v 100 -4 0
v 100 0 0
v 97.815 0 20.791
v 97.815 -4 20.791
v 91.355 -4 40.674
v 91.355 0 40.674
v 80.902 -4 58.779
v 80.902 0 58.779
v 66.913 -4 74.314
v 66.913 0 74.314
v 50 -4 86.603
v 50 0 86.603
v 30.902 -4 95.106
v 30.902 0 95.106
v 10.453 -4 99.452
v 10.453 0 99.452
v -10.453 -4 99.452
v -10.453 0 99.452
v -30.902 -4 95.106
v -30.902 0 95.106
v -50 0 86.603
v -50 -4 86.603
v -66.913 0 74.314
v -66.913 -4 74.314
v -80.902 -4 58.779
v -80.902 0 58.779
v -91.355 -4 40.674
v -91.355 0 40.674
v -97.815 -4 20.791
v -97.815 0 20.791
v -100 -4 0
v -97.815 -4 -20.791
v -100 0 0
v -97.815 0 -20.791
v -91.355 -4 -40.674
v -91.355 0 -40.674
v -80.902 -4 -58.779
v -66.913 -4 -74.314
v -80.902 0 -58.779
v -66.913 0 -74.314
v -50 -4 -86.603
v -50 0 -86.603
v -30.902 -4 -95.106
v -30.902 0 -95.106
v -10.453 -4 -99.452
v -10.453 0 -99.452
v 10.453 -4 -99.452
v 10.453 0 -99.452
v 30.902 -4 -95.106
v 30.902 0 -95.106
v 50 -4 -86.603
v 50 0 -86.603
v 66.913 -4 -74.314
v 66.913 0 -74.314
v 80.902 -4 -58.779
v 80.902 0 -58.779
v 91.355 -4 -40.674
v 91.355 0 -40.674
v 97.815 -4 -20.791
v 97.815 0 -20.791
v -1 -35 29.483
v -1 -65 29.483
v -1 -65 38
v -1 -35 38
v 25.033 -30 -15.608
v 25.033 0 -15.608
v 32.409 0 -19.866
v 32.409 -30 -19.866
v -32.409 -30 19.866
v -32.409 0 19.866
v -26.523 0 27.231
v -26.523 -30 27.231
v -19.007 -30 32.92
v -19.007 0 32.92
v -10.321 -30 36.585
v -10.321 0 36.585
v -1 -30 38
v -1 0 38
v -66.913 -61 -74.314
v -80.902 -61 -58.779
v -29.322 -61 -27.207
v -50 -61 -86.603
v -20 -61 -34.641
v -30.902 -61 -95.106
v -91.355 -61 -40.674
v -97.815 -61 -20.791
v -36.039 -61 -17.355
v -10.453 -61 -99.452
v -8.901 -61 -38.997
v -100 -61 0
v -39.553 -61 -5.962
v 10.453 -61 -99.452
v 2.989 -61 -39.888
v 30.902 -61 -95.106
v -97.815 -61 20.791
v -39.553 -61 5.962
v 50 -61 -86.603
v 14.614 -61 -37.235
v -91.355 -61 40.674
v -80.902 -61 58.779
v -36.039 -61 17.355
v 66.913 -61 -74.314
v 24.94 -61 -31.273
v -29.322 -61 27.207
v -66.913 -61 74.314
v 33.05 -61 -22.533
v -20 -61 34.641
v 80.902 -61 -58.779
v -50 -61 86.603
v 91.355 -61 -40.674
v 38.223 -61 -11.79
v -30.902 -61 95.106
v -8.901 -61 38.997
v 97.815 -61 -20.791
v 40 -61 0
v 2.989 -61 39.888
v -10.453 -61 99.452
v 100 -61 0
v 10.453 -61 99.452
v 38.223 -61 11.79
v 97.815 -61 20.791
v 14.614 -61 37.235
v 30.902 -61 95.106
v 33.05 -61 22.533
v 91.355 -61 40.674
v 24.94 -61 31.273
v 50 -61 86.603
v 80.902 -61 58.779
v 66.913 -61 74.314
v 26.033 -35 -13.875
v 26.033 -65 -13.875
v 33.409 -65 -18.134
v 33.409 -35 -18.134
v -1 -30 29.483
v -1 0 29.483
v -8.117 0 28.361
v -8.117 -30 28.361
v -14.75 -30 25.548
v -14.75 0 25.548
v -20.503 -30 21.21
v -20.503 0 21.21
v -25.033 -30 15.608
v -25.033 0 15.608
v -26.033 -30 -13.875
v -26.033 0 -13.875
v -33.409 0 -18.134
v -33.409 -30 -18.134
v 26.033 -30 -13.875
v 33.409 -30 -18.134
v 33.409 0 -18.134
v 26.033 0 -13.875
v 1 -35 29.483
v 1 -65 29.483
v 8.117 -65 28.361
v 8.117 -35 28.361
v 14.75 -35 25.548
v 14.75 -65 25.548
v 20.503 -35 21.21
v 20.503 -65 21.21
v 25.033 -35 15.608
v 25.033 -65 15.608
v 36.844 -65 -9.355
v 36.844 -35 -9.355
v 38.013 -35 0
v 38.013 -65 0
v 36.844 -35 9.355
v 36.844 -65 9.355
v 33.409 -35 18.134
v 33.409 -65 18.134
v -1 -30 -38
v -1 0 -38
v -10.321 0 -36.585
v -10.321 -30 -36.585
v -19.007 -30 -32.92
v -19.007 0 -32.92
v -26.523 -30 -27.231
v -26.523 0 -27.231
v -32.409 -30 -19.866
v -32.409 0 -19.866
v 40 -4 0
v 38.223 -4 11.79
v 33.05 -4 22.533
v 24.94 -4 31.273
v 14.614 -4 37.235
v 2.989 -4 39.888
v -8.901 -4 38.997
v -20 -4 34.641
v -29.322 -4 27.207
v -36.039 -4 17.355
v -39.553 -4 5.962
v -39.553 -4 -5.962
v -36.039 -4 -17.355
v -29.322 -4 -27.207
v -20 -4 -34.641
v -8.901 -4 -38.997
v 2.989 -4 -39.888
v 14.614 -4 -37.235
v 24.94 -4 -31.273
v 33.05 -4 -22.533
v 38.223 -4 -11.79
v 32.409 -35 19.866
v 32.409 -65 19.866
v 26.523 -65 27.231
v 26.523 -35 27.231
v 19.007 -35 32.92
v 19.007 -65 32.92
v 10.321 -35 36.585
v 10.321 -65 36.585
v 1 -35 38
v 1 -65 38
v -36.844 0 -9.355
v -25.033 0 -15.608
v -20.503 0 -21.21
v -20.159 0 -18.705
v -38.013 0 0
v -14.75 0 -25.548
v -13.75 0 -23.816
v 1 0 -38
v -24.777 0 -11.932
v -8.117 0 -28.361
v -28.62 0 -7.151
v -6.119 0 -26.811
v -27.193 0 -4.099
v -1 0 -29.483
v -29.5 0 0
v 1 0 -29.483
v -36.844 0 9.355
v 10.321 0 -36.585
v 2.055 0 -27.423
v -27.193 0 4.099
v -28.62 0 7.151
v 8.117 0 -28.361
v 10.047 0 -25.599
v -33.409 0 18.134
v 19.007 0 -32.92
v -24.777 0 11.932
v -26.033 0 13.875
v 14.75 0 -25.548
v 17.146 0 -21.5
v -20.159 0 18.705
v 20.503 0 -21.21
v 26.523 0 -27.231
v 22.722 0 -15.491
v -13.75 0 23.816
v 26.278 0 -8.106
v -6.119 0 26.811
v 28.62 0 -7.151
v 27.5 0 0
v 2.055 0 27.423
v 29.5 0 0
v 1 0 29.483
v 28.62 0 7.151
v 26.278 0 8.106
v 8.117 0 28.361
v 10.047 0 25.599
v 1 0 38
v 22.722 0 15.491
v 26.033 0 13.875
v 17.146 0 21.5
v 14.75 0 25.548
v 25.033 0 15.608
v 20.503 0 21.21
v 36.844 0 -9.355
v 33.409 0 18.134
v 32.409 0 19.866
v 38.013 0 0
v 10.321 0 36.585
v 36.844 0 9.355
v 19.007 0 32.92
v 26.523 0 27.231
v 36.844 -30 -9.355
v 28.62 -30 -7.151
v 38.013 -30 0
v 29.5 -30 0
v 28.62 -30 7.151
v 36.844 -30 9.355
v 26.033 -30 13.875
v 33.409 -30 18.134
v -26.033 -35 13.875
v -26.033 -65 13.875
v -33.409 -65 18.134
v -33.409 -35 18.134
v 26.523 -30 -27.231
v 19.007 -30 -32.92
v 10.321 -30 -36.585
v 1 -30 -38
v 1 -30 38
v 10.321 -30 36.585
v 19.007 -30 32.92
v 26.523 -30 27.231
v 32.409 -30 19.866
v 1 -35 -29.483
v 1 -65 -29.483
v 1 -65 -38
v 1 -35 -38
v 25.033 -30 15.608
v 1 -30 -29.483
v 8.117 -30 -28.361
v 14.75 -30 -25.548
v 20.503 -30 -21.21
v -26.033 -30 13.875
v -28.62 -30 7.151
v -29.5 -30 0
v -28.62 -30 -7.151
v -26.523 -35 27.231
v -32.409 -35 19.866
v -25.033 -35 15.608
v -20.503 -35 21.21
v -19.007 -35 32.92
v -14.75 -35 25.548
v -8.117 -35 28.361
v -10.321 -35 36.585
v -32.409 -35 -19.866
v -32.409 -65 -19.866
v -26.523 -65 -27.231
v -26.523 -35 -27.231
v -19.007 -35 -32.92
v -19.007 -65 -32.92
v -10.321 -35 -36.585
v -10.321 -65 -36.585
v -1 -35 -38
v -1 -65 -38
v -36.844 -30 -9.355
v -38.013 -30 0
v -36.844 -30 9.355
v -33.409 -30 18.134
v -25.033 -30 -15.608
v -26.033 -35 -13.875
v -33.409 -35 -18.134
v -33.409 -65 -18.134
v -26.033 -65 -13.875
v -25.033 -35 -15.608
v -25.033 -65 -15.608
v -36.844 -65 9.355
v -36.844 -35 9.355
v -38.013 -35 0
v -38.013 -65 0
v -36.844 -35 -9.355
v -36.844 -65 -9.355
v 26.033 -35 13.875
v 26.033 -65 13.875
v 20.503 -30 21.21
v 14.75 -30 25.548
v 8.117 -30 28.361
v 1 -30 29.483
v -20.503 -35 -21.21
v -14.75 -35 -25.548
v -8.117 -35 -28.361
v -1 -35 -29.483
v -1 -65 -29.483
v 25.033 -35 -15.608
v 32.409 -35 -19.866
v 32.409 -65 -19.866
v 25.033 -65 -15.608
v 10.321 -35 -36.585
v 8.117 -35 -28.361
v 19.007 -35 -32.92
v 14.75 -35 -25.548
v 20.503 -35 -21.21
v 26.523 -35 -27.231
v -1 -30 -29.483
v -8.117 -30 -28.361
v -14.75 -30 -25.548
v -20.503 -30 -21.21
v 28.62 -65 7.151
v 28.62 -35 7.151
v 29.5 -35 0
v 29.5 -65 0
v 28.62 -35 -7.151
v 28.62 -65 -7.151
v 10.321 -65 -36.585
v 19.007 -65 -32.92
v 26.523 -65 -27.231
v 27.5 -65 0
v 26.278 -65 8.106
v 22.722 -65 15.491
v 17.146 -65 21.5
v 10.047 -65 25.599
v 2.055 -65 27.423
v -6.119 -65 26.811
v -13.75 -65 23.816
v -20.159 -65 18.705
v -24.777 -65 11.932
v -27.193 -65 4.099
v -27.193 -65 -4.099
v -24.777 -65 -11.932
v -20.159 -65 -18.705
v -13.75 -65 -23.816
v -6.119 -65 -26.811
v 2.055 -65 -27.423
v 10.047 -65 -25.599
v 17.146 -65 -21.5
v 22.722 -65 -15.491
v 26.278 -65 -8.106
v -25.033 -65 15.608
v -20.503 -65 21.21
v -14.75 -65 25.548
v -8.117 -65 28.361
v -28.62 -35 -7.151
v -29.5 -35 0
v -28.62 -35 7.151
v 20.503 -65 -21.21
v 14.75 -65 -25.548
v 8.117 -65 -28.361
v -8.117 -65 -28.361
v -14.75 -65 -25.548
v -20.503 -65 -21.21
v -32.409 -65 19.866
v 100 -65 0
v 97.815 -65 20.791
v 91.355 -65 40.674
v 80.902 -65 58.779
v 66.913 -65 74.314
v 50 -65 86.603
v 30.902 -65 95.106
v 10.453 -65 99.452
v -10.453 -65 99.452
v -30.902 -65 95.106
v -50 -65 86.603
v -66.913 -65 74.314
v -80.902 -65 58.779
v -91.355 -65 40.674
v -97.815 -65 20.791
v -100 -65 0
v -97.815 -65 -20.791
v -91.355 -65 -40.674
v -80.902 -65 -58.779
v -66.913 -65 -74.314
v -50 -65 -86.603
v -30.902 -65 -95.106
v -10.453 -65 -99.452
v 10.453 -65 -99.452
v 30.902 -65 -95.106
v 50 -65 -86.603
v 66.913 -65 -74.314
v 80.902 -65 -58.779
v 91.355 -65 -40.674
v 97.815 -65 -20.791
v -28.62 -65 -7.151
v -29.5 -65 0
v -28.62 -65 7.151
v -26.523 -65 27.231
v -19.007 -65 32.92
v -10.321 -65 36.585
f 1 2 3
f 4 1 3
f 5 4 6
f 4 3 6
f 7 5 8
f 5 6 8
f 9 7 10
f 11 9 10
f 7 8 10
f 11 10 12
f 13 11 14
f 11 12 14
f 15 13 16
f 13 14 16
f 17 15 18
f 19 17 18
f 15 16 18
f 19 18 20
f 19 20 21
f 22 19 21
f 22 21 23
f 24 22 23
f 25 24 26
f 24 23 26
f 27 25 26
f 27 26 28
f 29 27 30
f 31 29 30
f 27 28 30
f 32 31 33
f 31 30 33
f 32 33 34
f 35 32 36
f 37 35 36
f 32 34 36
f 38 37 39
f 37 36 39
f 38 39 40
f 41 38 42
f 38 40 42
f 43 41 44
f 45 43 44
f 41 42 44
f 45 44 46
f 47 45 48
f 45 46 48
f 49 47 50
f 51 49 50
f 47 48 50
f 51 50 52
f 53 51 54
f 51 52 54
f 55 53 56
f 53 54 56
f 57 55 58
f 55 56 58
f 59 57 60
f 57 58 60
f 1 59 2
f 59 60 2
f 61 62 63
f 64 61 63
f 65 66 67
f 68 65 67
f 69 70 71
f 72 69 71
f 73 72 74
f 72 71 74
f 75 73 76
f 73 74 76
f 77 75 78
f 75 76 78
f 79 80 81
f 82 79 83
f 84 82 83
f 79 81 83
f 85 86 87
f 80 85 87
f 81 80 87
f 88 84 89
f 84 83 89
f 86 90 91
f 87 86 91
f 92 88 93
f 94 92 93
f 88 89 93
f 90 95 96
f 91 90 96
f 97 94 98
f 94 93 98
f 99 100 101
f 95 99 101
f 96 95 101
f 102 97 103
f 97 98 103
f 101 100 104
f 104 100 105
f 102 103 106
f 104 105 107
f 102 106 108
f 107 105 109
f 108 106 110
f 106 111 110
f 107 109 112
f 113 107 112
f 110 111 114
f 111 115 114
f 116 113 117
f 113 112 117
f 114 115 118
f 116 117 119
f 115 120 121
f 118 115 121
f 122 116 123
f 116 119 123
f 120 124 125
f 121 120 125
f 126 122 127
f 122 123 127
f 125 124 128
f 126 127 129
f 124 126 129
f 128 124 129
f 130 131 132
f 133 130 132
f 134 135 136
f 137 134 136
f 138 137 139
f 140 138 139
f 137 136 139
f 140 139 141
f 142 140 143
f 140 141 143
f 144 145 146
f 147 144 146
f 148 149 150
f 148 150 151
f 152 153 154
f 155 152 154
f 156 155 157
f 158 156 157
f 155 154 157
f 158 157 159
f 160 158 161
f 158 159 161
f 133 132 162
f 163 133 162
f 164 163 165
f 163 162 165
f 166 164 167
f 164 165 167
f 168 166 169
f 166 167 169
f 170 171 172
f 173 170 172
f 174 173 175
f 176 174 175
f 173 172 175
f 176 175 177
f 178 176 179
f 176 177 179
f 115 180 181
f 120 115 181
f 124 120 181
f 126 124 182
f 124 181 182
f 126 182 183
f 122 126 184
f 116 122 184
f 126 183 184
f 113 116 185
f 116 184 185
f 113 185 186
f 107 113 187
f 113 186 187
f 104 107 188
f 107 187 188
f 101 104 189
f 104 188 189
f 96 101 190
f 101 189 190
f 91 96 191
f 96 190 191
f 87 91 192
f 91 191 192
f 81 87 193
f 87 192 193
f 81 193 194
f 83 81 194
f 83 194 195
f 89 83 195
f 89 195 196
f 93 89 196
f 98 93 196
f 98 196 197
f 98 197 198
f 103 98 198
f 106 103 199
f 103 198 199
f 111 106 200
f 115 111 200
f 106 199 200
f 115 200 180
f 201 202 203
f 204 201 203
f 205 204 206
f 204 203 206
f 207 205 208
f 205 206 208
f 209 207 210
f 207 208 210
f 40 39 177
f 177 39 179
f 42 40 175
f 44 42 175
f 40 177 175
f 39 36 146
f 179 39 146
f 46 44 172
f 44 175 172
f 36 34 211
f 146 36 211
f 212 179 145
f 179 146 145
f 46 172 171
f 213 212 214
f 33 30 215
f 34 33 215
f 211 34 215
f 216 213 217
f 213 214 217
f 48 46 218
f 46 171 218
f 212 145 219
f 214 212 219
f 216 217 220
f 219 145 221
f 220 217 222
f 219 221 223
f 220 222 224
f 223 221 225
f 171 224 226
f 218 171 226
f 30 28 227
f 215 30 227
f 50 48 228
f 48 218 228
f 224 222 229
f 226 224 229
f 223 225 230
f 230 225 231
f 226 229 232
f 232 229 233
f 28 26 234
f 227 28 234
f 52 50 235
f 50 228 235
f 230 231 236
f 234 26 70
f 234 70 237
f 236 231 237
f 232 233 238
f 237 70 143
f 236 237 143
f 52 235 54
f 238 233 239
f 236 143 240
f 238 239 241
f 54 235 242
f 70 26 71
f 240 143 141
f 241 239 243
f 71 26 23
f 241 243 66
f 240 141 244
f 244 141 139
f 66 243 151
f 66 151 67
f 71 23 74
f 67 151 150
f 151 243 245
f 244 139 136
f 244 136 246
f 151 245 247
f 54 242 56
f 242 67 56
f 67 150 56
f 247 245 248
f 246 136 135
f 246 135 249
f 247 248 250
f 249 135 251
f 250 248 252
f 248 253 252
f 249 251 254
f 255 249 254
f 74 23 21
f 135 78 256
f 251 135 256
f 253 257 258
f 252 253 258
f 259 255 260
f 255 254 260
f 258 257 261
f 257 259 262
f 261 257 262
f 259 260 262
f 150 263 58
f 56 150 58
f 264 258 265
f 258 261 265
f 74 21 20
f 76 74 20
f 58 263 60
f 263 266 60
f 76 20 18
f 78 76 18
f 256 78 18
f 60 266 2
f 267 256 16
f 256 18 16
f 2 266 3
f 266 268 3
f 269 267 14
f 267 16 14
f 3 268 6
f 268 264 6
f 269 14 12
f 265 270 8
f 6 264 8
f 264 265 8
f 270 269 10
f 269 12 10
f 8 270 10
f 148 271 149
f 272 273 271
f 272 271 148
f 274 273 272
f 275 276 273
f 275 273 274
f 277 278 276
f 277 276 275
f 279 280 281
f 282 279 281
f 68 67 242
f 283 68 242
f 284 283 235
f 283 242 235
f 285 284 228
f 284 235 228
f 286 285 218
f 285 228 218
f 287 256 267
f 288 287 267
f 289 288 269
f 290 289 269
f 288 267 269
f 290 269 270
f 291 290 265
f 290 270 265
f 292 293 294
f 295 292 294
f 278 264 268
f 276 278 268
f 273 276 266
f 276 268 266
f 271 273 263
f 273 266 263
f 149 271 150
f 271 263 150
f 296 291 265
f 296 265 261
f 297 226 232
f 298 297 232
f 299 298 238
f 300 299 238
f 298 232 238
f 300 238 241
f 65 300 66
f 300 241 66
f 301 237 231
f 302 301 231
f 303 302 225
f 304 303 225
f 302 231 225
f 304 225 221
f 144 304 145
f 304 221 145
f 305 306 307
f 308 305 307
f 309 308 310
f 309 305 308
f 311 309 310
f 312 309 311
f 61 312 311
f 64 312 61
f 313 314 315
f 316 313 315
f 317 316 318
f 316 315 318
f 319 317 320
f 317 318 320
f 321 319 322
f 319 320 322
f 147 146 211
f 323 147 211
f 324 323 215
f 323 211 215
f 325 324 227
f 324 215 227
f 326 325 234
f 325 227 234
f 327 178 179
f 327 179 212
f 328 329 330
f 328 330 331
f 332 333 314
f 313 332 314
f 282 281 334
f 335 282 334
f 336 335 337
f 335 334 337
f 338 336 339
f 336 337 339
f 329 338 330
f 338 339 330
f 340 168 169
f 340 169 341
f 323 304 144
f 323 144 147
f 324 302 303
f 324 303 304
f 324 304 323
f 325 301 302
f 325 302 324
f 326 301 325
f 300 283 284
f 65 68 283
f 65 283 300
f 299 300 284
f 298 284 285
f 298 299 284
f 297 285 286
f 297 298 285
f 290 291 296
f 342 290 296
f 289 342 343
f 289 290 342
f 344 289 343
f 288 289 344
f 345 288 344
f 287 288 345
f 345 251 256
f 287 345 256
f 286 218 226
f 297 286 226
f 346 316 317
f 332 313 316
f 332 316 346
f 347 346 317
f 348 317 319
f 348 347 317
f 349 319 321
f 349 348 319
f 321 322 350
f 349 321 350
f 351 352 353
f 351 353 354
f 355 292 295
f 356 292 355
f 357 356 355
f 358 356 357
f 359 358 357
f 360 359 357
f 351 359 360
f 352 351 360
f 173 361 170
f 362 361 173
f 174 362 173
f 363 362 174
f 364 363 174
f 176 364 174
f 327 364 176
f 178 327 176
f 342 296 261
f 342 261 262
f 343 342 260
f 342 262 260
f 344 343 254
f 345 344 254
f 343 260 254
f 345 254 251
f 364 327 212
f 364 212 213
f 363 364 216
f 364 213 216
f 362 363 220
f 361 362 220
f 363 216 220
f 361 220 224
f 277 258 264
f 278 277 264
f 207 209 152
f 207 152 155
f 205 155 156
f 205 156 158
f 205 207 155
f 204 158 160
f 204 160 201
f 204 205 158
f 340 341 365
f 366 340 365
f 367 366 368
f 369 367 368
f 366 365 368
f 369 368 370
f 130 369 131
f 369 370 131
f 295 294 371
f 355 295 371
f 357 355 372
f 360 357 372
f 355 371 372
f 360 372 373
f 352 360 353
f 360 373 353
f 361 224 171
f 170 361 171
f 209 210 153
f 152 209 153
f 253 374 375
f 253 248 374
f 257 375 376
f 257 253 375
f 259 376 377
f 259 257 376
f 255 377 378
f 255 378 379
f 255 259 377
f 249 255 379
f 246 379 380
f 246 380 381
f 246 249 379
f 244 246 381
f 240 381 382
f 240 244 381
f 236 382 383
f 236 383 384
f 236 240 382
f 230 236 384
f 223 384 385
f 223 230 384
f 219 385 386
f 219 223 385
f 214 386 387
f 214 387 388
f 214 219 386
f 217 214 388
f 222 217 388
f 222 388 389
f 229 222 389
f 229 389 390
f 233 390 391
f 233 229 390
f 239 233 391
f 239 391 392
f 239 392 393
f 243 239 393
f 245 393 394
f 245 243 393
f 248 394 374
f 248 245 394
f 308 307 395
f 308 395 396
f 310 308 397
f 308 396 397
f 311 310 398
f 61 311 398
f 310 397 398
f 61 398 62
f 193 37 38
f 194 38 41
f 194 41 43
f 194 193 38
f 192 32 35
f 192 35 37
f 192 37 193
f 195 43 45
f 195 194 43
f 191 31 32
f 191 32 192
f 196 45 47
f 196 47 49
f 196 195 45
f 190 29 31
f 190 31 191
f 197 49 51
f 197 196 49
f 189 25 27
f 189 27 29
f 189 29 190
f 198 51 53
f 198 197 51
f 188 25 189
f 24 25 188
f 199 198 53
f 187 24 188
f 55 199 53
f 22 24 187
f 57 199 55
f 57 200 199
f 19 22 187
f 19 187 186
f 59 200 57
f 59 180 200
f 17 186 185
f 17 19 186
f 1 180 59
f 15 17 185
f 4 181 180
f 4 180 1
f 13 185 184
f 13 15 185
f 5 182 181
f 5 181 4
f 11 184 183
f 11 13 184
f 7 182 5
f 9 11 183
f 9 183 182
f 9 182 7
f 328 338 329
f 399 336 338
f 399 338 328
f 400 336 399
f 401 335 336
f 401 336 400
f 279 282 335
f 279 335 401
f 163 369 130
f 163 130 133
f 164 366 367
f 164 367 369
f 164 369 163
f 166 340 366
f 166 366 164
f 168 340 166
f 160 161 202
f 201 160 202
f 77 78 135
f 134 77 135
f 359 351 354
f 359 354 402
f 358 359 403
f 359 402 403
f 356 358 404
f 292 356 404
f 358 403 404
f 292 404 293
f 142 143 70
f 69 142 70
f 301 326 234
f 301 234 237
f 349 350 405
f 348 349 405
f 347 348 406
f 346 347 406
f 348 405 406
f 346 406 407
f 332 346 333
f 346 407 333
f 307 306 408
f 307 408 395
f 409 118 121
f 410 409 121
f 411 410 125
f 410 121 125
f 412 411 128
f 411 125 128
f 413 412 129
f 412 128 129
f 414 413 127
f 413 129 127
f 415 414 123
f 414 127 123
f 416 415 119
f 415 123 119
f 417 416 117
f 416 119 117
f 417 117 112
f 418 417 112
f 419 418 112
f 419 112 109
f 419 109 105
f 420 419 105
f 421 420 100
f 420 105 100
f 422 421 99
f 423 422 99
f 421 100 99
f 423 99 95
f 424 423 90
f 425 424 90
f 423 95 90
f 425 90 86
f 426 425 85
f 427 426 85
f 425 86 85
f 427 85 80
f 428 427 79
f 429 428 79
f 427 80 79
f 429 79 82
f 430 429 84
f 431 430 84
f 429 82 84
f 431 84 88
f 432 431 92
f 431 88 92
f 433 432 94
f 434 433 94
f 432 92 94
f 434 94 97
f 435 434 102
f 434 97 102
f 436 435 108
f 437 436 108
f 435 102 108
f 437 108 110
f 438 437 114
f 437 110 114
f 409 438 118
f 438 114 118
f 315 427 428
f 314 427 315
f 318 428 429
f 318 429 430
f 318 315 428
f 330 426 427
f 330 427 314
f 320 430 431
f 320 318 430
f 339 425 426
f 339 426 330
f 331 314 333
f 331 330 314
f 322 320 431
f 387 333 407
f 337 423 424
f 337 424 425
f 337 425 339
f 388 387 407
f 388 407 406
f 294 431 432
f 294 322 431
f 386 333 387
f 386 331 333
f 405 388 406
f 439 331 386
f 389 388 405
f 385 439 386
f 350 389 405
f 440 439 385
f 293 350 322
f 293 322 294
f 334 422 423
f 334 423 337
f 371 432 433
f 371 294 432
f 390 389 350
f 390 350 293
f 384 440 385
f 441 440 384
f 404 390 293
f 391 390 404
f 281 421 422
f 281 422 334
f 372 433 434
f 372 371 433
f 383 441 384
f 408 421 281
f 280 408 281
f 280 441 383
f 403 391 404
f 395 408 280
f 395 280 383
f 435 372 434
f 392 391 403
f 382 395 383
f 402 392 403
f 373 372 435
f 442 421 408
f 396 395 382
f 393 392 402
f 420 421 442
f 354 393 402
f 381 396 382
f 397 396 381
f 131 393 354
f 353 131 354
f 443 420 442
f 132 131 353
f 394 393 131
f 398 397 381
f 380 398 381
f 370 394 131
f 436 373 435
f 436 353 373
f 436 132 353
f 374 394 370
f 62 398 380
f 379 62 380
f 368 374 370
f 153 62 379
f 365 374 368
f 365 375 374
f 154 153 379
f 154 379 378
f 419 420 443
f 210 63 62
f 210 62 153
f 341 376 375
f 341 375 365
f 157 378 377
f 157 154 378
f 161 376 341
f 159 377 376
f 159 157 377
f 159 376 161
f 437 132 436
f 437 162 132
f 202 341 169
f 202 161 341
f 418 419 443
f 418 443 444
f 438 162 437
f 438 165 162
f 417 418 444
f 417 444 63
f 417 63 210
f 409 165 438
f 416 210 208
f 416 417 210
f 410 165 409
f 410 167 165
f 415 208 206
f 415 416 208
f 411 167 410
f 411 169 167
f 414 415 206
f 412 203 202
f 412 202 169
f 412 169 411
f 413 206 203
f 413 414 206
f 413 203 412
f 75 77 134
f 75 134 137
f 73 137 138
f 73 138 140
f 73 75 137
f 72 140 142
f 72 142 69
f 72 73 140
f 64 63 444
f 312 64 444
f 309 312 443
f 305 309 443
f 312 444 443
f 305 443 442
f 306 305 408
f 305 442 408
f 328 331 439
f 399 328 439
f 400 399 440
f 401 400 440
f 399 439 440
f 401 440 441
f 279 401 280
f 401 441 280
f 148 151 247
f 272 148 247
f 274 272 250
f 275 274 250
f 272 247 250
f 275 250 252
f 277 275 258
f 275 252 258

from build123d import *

# Parameters (mm, degrees)
F0_R     = 100
F0_R_2   = 27.5
F1_DEPTH = 4
F2_R     = 40
F2_R_2   = 27.5
F3_DEPTH = 57
F4_R     = 100
F4_R_2   = 27.5
F5_DEPTH = 4
F7_DEPTH = 30
F9_DEPTH = 30


with BuildPart() as f1:
    # F0 (on Front) → F1 (new body)
    with BuildSketch(Plane.XZ):
        Circle(F0_R)
        Circle(F0_R_2, mode=Mode.SUBTRACT)
    extrude(amount=F1_DEPTH)

    # F2 (on face) → F3 (join)
    with BuildSketch(Plane.XZ.offset(4)):
        Circle(F2_R)
        Circle(F2_R_2, mode=Mode.SUBTRACT)
    extrude(amount=F3_DEPTH)

    # F4 (on face) → F5 (join)
    with BuildSketch(Plane.XZ.offset(61)):
        Circle(F4_R)
        Circle(F4_R_2, mode=Mode.SUBTRACT)
    extrude(amount=F5_DEPTH)

    # F6 (on face) → F7 (cut)
    with BuildSketch(Plane(origin=(0, 0, 0), x_dir=(-1, 0, 0), z_dir=(0, 1, 0))):
        with BuildLine():
            ThreePointArc((32.408965, 19.866025), (19.006578, 32.920358), (1, 38))
            Line((1, 38), (1, 29.483046))
            ThreePointArc((1, 29.483046), (14.75, 25.547749), (25.033067, 15.607548))
            Line((25.033067, 15.607548), (32.408965, 19.866025))
        make_face()
        with BuildLine():
            ThreePointArc((-25.033067, 15.607548), (-14.75, 25.547749), (-1, 29.483046))
            Line((-1, 29.483046), (-1, 38))
            ThreePointArc((-1, 38), (-19.006578, 32.920358), (-32.408965, 19.866025))
            Line((-32.408965, 19.866025), (-25.033067, 15.607548))
        make_face()
        with BuildLine():
            ThreePointArc((-26.033067, -13.875498), (-29.5, 0), (-26.033067, 13.875498))
            Line((-26.033067, 13.875498), (-33.408965, 18.133975))
            ThreePointArc((-33.408965, 18.133975), (-38.013156, 0), (-33.408965, -18.133975))
            Line((-33.408965, -18.133975), (-26.033067, -13.875498))
        make_face()
        with BuildLine():
            ThreePointArc((-1, -29.483046), (-14.75, -25.547749), (-25.033067, -15.607548))
            Line((-25.033067, -15.607548), (-32.408965, -19.866025))
            ThreePointArc((-32.408965, -19.866025), (-19.006578, -32.920358), (-1, -38))
            Line((-1, -38), (-1, -29.483046))
        make_face()
        with BuildLine():
            ThreePointArc((25.033067, -15.607548), (14.75, -25.547749), (1, -29.483046))
            Line((1, -29.483046), (1, -38))
            ThreePointArc((1, -38), (19.006578, -32.920358), (32.408965, -19.866025))
            Line((32.408965, -19.866025), (25.033067, -15.607548))
        make_face()
        with BuildLine():
            ThreePointArc((26.033067, 13.875498), (29.5, 0), (26.033067, -13.875498))
            Line((26.033067, -13.875498), (33.408965, -18.133975))
            ThreePointArc((33.408965, -18.133975), (38.013156, 0), (33.408965, 18.133975))
            Line((33.408965, 18.133975), (26.033067, 13.875498))
        make_face()
    extrude(amount=-F7_DEPTH, mode=Mode.SUBTRACT)

    # F8 (on face) → F9 (cut)
    with BuildSketch(Plane.XZ.offset(65)):
        with BuildLine():
            ThreePointArc((32.408965, 19.866025), (19.006578, 32.920358), (1, 38))
            Line((1, 38), (1, 29.483046))
            ThreePointArc((1, 29.483046), (14.75, 25.547749), (25.033067, 15.607548))
            Line((25.033067, 15.607548), (32.408965, 19.866025))
        make_face()
        with BuildLine():
            Line((-32.408965, 19.866025), (-25.033067, 15.607548))
            ThreePointArc((-25.033067, 15.607548), (-14.75, 25.547749), (-1, 29.483046))
            Line((-1, 29.483046), (-1, 38))
            ThreePointArc((-1, 38), (-19.006578, 32.920358), (-32.408965, 19.866025))
        make_face()
        with BuildLine():
            Line((-33.408965, -18.133975), (-26.033067, -13.875498))
            ThreePointArc((-26.033067, -13.875498), (-29.5, 0), (-26.033067, 13.875498))
            Line((-26.033067, 13.875498), (-33.408965, 18.133975))
            ThreePointArc((-33.408965, 18.133975), (-38.013156, 0), (-33.408965, -18.133975))
        make_face()
        with BuildLine():
            Line((-1, -38), (-1, -29.483046))
            ThreePointArc((-1, -29.483046), (-14.75, -25.547749), (-25.033067, -15.607548))
            Line((-25.033067, -15.607548), (-32.408965, -19.866025))
            ThreePointArc((-32.408965, -19.866025), (-19.006578, -32.920358), (-1, -38))
        make_face()
        with BuildLine():
            Line((32.408965, -19.866025), (25.033067, -15.607548))
            ThreePointArc((25.033067, -15.607548), (14.75, -25.547749), (1, -29.483046))
            Line((1, -29.483046), (1, -38))
            ThreePointArc((1, -38), (19.006578, -32.920358), (32.408965, -19.866025))
        make_face()
        with BuildLine():
            Line((33.408965, 18.133975), (26.033067, 13.875498))
            ThreePointArc((26.033067, 13.875498), (29.5, 0), (26.033067, -13.875498))
            Line((26.033067, -13.875498), (33.408965, -18.133975))
            ThreePointArc((33.408965, -18.133975), (38.013156, 0), (33.408965, 18.133975))
        make_face()
    extrude(amount=-F9_DEPTH, mode=Mode.SUBTRACT)


solid = f1.part
